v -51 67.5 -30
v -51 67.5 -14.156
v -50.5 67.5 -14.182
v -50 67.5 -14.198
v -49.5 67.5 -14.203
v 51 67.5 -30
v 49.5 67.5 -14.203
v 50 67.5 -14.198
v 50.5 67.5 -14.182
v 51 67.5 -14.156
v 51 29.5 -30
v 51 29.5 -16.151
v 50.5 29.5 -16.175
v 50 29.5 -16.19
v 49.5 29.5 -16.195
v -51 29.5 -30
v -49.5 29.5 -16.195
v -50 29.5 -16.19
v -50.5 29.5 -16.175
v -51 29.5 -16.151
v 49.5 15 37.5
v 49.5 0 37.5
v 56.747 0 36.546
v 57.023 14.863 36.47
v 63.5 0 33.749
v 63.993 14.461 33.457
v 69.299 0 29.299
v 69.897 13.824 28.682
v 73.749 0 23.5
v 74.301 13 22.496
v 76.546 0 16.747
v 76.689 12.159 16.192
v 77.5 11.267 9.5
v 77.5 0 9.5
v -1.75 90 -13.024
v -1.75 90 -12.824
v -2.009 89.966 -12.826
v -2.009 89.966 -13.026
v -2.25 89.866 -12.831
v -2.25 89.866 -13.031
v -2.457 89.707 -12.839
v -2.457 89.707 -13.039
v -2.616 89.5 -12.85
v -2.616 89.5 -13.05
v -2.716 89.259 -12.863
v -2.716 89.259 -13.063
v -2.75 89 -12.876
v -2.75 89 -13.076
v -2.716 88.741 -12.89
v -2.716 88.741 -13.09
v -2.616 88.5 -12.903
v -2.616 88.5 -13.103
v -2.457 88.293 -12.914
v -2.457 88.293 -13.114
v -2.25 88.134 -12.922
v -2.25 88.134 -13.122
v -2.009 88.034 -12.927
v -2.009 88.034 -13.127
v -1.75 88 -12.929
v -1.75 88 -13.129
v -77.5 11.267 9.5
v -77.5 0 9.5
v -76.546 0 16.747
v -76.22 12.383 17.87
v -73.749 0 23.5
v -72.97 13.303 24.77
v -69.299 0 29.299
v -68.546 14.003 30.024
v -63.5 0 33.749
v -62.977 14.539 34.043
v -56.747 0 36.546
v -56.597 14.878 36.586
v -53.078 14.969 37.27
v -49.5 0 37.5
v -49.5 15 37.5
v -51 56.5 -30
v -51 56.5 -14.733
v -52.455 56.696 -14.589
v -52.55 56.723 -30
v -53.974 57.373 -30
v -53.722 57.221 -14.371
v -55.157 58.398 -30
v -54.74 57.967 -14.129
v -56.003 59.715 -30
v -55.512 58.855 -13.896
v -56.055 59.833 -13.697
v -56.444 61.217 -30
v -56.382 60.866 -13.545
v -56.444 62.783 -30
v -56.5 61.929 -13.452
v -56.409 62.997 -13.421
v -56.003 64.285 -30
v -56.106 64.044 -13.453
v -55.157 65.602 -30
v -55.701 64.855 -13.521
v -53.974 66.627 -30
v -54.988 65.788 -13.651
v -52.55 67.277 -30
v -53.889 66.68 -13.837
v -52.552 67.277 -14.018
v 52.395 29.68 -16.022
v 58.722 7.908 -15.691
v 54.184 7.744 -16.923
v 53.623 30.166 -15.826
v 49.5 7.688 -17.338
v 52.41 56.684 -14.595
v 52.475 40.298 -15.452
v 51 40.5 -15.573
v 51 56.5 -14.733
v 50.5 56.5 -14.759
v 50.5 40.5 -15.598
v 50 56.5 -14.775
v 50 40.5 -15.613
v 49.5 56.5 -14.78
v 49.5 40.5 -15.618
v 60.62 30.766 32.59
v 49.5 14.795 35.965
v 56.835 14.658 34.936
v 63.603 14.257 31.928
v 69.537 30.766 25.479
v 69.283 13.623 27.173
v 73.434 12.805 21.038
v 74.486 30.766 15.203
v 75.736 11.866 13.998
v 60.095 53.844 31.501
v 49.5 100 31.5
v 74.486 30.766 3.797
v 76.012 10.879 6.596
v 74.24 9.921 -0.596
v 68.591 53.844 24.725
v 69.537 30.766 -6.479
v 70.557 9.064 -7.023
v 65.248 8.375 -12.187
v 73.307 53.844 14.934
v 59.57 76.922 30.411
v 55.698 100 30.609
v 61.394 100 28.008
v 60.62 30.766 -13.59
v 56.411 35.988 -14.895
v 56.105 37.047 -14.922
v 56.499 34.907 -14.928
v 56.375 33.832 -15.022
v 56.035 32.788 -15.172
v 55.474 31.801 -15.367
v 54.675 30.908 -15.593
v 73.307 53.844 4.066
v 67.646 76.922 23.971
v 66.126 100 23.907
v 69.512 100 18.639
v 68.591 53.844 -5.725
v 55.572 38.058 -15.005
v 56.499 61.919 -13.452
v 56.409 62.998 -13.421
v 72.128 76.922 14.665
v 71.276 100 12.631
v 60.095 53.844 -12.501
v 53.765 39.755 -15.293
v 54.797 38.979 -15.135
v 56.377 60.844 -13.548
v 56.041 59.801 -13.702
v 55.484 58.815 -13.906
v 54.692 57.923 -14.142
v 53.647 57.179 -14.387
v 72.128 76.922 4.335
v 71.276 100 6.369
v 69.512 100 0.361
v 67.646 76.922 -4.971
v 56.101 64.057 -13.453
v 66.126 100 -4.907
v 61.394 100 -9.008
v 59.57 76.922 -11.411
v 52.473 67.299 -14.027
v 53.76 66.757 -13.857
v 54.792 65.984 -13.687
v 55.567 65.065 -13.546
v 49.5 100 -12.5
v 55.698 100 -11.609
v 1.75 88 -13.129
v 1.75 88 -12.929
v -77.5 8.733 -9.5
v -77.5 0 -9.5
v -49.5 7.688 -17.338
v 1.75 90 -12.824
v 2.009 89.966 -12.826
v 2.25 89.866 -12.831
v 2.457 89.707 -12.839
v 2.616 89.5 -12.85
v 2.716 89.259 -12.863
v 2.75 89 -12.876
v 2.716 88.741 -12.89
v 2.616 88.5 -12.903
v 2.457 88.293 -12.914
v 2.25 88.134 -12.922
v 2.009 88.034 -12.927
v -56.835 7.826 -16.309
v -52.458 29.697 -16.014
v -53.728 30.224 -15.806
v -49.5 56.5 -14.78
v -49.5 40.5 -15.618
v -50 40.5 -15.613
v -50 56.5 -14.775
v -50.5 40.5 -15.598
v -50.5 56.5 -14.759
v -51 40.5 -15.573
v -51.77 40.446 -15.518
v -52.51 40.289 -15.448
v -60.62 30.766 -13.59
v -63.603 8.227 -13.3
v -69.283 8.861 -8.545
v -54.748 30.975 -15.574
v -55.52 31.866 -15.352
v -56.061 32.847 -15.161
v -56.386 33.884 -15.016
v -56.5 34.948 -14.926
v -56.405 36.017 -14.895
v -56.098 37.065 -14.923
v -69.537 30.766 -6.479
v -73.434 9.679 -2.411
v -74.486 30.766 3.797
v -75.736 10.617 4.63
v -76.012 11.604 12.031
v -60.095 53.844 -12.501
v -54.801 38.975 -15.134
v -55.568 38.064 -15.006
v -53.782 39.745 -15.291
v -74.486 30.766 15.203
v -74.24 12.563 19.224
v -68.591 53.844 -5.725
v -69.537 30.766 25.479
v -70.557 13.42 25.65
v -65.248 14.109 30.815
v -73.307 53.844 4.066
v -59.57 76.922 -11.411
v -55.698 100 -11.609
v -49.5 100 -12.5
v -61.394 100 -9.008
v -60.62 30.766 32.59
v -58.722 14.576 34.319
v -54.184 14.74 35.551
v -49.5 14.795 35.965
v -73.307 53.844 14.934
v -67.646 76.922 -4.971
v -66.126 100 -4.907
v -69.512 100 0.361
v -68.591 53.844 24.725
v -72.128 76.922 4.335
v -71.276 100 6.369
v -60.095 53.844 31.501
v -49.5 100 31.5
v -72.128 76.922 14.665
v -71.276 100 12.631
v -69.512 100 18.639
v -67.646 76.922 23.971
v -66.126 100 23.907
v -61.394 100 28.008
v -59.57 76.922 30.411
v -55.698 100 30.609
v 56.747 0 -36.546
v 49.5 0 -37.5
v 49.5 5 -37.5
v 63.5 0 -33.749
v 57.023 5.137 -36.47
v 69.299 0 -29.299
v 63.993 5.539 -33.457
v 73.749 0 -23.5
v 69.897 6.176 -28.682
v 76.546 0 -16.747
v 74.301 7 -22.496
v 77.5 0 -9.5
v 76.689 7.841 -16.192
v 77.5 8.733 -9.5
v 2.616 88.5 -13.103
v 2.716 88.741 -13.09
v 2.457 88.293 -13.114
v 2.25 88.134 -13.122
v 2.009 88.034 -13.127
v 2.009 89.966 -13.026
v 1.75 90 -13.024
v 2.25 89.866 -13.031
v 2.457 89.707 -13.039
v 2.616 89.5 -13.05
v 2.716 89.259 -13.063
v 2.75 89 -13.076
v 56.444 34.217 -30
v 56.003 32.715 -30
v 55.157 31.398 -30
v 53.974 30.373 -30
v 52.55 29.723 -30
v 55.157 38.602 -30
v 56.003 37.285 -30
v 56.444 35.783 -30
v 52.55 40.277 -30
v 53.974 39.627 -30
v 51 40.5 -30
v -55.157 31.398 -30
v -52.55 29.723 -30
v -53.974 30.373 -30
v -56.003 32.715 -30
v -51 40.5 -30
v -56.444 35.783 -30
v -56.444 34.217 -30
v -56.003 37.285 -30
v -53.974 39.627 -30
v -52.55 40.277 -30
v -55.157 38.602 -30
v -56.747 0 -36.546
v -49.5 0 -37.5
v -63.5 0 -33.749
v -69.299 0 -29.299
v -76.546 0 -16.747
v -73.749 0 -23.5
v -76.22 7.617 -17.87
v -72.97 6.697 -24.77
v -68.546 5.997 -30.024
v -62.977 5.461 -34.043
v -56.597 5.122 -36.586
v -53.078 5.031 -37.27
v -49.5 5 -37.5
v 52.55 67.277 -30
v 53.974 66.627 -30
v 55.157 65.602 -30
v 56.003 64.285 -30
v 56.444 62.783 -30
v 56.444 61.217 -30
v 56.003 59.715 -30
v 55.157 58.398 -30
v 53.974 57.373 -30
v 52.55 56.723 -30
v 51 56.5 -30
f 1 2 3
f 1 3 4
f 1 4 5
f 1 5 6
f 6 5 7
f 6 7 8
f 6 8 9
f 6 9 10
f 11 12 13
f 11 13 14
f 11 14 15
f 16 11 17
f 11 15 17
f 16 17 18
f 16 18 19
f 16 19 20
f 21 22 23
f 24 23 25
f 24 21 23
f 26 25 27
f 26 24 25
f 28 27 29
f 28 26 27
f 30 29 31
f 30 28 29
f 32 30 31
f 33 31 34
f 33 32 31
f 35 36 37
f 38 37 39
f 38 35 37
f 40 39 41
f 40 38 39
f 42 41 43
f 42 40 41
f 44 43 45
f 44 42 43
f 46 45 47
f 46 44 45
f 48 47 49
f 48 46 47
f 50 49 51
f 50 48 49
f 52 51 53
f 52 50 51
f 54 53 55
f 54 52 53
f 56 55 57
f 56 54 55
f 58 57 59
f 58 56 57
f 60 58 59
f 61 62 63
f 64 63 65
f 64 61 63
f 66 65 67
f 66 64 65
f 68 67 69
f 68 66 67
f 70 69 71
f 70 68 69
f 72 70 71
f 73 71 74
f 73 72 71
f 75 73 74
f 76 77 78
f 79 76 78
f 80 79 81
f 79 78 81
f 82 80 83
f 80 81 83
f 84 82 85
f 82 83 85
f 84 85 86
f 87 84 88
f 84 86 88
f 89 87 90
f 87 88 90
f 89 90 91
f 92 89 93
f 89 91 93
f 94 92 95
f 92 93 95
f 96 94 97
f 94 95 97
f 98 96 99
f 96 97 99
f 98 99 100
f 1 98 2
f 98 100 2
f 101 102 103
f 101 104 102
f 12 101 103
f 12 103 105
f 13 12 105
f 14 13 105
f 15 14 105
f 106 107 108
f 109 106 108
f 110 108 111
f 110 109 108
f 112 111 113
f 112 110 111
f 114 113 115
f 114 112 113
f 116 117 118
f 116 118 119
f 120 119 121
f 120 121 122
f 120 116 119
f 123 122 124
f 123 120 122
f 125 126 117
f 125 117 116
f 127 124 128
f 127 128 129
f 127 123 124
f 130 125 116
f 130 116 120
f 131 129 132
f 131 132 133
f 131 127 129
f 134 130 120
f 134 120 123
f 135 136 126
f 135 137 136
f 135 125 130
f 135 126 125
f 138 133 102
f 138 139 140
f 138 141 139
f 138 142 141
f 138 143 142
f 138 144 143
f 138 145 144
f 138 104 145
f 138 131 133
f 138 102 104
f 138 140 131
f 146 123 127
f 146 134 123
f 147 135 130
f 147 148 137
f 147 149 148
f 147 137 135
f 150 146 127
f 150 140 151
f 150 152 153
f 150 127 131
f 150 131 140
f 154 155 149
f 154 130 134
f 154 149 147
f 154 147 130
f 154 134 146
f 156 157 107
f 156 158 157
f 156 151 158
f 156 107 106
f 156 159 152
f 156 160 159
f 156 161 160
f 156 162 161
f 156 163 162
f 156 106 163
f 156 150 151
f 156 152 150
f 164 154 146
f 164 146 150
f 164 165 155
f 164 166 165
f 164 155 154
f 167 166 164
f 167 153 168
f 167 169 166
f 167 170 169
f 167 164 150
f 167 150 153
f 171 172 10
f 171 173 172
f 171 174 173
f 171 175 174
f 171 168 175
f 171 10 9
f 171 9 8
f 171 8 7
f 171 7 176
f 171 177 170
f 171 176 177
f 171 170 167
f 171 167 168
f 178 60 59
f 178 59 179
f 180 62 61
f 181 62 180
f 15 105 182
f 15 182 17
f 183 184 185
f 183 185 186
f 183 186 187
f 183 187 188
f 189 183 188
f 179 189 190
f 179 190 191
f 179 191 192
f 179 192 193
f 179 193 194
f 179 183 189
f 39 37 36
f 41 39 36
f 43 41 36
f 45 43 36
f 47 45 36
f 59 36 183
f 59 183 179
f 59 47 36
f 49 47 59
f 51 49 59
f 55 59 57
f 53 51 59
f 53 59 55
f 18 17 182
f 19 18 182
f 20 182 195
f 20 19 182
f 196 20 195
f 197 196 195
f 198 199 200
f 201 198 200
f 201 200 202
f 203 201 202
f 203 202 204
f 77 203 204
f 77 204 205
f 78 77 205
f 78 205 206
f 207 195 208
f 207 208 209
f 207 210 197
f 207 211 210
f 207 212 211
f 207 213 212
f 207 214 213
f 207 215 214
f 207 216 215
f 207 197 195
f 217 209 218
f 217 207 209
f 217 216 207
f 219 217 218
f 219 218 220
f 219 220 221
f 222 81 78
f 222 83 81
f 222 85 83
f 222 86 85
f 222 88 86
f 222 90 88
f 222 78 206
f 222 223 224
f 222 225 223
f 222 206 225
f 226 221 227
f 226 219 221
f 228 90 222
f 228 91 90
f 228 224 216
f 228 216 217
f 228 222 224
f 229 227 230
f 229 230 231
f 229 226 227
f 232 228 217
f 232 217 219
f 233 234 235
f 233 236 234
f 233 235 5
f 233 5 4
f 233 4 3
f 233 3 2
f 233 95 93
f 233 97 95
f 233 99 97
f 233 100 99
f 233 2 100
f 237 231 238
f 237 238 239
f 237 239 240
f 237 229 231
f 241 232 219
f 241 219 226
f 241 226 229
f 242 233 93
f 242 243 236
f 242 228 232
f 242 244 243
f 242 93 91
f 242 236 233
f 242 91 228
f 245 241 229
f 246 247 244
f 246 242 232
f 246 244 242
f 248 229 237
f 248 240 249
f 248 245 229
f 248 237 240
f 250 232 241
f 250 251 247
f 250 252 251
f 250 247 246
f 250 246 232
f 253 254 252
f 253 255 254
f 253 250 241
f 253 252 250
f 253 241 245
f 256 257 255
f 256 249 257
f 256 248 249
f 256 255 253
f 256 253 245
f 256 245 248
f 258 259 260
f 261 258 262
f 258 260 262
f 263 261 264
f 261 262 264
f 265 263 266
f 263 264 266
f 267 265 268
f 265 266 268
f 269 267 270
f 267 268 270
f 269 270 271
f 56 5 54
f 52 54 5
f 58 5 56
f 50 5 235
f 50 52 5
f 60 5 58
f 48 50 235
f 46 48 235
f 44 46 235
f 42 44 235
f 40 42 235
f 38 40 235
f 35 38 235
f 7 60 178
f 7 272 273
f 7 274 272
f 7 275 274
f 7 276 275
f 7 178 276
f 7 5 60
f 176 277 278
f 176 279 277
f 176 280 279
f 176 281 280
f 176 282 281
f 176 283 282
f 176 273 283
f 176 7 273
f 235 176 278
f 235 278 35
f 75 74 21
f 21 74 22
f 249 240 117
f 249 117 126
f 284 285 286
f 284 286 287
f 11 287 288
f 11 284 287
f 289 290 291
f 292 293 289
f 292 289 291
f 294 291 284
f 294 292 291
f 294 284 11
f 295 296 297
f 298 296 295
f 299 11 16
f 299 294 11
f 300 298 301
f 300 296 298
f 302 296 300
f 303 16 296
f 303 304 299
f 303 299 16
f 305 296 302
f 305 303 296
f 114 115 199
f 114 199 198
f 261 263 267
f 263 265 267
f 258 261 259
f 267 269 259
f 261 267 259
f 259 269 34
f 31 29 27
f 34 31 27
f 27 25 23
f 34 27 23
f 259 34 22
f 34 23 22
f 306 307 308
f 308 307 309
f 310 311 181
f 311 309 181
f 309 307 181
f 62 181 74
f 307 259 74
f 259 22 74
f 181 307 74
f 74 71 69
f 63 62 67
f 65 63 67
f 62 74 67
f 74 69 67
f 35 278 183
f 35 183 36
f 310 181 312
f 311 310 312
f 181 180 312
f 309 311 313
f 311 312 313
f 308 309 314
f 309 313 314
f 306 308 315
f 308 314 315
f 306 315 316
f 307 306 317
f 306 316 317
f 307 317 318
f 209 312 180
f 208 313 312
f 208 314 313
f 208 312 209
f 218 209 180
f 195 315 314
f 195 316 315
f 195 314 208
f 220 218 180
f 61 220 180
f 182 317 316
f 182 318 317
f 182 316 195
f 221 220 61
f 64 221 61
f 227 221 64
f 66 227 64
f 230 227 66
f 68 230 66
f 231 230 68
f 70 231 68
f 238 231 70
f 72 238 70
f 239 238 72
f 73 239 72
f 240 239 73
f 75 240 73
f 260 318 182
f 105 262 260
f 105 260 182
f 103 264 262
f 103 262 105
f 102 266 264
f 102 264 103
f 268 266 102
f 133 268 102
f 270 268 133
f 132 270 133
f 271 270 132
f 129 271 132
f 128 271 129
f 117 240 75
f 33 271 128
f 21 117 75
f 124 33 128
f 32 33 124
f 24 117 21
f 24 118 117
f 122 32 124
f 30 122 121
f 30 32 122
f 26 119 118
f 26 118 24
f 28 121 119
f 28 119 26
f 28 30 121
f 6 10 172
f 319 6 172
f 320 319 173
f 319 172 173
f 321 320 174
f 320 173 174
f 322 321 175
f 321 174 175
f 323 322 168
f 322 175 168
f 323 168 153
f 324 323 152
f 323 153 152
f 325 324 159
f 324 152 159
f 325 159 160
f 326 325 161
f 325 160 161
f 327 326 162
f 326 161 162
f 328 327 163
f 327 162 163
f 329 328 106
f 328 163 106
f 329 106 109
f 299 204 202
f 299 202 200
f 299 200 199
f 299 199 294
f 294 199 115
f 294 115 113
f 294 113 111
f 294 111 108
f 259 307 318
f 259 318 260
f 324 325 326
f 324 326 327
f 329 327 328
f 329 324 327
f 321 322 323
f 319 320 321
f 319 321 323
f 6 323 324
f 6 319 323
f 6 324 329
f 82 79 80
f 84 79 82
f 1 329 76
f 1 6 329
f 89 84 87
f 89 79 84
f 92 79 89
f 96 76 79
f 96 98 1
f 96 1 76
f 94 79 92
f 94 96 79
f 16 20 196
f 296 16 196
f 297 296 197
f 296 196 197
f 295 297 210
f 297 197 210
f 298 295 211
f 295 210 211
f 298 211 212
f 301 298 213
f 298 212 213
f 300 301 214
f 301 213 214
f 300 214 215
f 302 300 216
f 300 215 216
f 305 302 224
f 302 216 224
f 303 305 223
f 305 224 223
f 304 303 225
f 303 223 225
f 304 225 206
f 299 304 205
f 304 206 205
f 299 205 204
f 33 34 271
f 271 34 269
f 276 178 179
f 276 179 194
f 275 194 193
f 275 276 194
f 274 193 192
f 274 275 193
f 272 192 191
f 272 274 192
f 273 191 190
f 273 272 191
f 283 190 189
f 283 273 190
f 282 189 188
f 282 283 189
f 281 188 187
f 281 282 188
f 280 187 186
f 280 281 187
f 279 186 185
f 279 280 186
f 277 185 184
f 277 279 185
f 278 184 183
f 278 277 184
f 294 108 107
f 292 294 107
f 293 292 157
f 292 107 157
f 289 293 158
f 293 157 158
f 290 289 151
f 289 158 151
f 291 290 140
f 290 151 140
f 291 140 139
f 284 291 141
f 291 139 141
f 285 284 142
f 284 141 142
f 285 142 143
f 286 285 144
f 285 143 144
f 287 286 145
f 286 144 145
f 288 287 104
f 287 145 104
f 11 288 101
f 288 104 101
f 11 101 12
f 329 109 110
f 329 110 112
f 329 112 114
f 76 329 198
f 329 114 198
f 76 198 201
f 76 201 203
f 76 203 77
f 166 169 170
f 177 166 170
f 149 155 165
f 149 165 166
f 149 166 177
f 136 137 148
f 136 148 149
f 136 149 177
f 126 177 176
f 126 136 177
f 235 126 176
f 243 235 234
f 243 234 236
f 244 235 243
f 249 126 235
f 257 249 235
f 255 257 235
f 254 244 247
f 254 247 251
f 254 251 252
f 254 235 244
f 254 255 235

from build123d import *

# Parameters (mm, degrees)
SKETCH_2_W          = 155
SKETCH_2_H          = 75
EXTRUDE_1_DEPTH     = 15
CUT_EXTRUDE_1_DEPTH = 161.175684796
FILLET_1_R          = 28
EXTRUDE_2_DEPTH     = 100
CHAMFER_1_SIZE      = 95.405683439
CHAMFER_1_SIZE_2    = 5
EXTRUDE_3_DEPTH     = 30
CUT_EXTRUDE_4_REACH = 145.596


with BuildPart() as part:
    # 스케치2 → 보스-돌출1 (new body)
    with BuildSketch(Plane(origin=(0, 0, 0), x_dir=(1, 0, 0), z_dir=(0, 1, 0))):
        Rectangle(SKETCH_2_W, SKETCH_2_H)
    extrude(amount=EXTRUDE_1_DEPTH)

    # 스케치3 → 컷-돌출1 (cut, through all)
    with BuildSketch(Plane(origin=(77.5, 0, 0), x_dir=(0, 0, -1), z_dir=(1, 0, 0))):
        Polygon((37.5, 5), (-37.5, 15), (37.5, 15), align=None)
    extrude(amount=-CUT_EXTRUDE_1_DEPTH, mode=Mode.SUBTRACT)

    # 필렛1
    fillet_1_edges = [part.edges().sort_by_distance(p)[0] for p in [
        (-77.5, 2.5, -37.5),
        (77.5, 2.5, -37.5),
        (77.5, 7.5, 37.5),
        (-77.5, 7.5, 37.5),
    ]]
    fillet(fillet_1_edges, radius=FILLET_1_R)

    # 스케치4 → 보스-돌출2 (add)
    with BuildSketch(Plane.XZ):
        with BuildLine():
            Line((-49.5, 36.5), (49.5, 36.5))
            ThreePointArc((49.5, 36.5), (76.5, 9.5), (49.5, -17.5))
            Line((49.5, -17.5), (-49.5, -17.5))
            ThreePointArc((-49.5, -17.5), (-76.5, 9.5), (-49.5, 36.5))
        make_face()
    extrude(amount=-EXTRUDE_2_DEPTH)

    # 모따기1
    # the kernel refuses this chamfer: 95.405683439, 5 mm, written as the material it takes off along each edge
    with BuildSketch(Plane(origin=(-49.5, 100, 36.5), x_dir=(0, -0.9999979738662977, 0.0020130234223821315), z_dir=(1, 0, 0))) as chamfer_1_piece_1_section:
        Polygon((CHAMFER_1_SIZE * 0.999997973863, CHAMFER_1_SIZE * 0.00201302342237), (-CHAMFER_1_SIZE_2 * 0.00201302342238, CHAMFER_1_SIZE_2 * 0.999997973866), (0, 0), align=None)
    chamfer_1_piece_1 = extrude(amount=99, mode=Mode.PRIVATE)
    chamfer_1_piece_1 = split(chamfer_1_piece_1, bisect_by=Plane(origin=(0, 15.586966884, 41.90225163), z_dir=(0, 0.9912279006826347, -0.13216372009101798)), keep=Keep.TOP, mode=Mode.PRIVATE)
    add(chamfer_1_piece_1, mode=Mode.SUBTRACT)
    with BuildSketch(Plane(origin=(-49.5, 100, 9.5), x_dir=(0, 0, -1), z_dir=(1, 0, 0))) as chamfer_1_piece_2_section:
        Polygon((27, -CHAMFER_1_SIZE), (27 - CHAMFER_1_SIZE_2, 0), (27, 0), align=None)
    chamfer_1_piece_2 = revolve(axis=Axis((-49.5, 100, 9.5), (0, 1, 0)), revolution_arc=180, mode=Mode.PRIVATE)
    chamfer_1_piece_2 = split(chamfer_1_piece_2, bisect_by=Plane(origin=(-74.18479248, 12.010621427, 15.0796607), z_dir=(0, 0.9912279006826347, -0.13216372009101798)), keep=Keep.TOP, mode=Mode.PRIVATE)
    add(chamfer_1_piece_2, mode=Mode.SUBTRACT)
    with BuildSketch(Plane(origin=(49.5, 100, 9.5), x_dir=(0, 0, 1), z_dir=(-1, 0, 0))) as chamfer_1_piece_3_section:
        Polygon((27, -CHAMFER_1_SIZE), (27 - CHAMFER_1_SIZE_2, 0), (27, 0), align=None)
    chamfer_1_piece_3 = revolve(axis=Axis((49.5, 100, 9.5), (0, 1, 0)), revolution_arc=180, mode=Mode.PRIVATE)
    chamfer_1_piece_3 = split(chamfer_1_piece_3, bisect_by=Plane(origin=(74.18479248, 12.010621427, 15.0796607), z_dir=(0, 0.9912279006826347, -0.13216372009101798)), keep=Keep.TOP, mode=Mode.PRIVATE)
    add(chamfer_1_piece_3, mode=Mode.SUBTRACT)
    with BuildSketch(Plane(origin=(49.5, 100, -17.5), x_dir=(0, -0.9999979738662977, -0.0020130234223820955), z_dir=(-1, 0, 0))) as chamfer_1_piece_4_section:
        Polygon((CHAMFER_1_SIZE * 0.999997973863, CHAMFER_1_SIZE * 0.00201302342237), (-CHAMFER_1_SIZE_2 * 0.00201302342238, CHAMFER_1_SIZE_2 * 0.999997973866), (0, 0), align=None)
    chamfer_1_piece_4 = extrude(amount=99, mode=Mode.PRIVATE)
    chamfer_1_piece_4 = split(chamfer_1_piece_4, bisect_by=Plane(origin=(0, 8.9149356, -8.137983001), z_dir=(0, 0.9912279006826347, -0.13216372009101798)), keep=Keep.TOP, mode=Mode.PRIVATE)
    add(chamfer_1_piece_4, mode=Mode.SUBTRACT)

    # 스케치6 → 보스-돌출3 (add)
    with BuildSketch(Plane.XY):
        with BuildLine():
            Line((-51, 67.5), (51, 67.5))
            ThreePointArc((51, 67.5), (56.5, 62), (51, 56.5))
            Line((51, 56.5), (-51, 56.5))
            ThreePointArc((-51, 56.5), (-56.5, 62), (-51, 67.5))
        make_face()
        with BuildLine():
            Line((-51, 40.5), (51, 40.5))
            ThreePointArc((51, 40.5), (56.5, 35), (51, 29.5))
            Line((51, 29.5), (-51, 29.5))
            ThreePointArc((-51, 29.5), (-56.5, 35), (-51, 40.5))
        make_face()
    extrude(amount=-EXTRUDE_3_DEPTH)

    # 컷-돌출4: from a plane face, 145.596 long prism both ways, kept between that surface and its translate by the depth
    cut_extrude_4_start = Plane(origin=(-49.5, 4.594316561, -17.5), z_dir=(0, 0.05233595624294105, -0.998629534754574)) * Box(584.384, 584.384, 292.192, align=(Align.CENTER, Align.CENTER, Align.MIN), mode=Mode.PRIVATE)
    cut_extrude_4_end = Plane(origin=(-49.5, 4.594316561, -17.3), z_dir=(0, 0.05233595624294105, -0.998629534754574)) * Box(584.384, 584.384, 292.192, align=(Align.CENTER, Align.CENTER, Align.MIN), mode=Mode.PRIVATE)
    # 스케치8 → 컷-돌출4 (cut, from a surface)
    with BuildSketch(Plane(origin=(0, 0, -30), x_dir=(-1, 0, 0), z_dir=(0, 0, -1)), mode=Mode.PRIVATE) as cut_extrude_4_sk1:
        with BuildLine():
            Line((-1.75, 90), (1.75, 90))
            ThreePointArc((1.75, 90), (2.75, 89), (1.75, 88))
            Line((1.75, 88), (-1.75, 88))
            ThreePointArc((-1.75, 88), (-2.75, 89), (-1.75, 90))
        make_face()
    cut_extrude_4_tool1 = extrude(cut_extrude_4_sk1.sketch, amount=CUT_EXTRUDE_4_REACH, both=True, mode=Mode.PRIVATE)
    add(((cut_extrude_4_tool1 - cut_extrude_4_start) & cut_extrude_4_end).solids().sort_by_distance((0, 89, -12.976486))[0], mode=Mode.SUBTRACT)


solid = part.part
